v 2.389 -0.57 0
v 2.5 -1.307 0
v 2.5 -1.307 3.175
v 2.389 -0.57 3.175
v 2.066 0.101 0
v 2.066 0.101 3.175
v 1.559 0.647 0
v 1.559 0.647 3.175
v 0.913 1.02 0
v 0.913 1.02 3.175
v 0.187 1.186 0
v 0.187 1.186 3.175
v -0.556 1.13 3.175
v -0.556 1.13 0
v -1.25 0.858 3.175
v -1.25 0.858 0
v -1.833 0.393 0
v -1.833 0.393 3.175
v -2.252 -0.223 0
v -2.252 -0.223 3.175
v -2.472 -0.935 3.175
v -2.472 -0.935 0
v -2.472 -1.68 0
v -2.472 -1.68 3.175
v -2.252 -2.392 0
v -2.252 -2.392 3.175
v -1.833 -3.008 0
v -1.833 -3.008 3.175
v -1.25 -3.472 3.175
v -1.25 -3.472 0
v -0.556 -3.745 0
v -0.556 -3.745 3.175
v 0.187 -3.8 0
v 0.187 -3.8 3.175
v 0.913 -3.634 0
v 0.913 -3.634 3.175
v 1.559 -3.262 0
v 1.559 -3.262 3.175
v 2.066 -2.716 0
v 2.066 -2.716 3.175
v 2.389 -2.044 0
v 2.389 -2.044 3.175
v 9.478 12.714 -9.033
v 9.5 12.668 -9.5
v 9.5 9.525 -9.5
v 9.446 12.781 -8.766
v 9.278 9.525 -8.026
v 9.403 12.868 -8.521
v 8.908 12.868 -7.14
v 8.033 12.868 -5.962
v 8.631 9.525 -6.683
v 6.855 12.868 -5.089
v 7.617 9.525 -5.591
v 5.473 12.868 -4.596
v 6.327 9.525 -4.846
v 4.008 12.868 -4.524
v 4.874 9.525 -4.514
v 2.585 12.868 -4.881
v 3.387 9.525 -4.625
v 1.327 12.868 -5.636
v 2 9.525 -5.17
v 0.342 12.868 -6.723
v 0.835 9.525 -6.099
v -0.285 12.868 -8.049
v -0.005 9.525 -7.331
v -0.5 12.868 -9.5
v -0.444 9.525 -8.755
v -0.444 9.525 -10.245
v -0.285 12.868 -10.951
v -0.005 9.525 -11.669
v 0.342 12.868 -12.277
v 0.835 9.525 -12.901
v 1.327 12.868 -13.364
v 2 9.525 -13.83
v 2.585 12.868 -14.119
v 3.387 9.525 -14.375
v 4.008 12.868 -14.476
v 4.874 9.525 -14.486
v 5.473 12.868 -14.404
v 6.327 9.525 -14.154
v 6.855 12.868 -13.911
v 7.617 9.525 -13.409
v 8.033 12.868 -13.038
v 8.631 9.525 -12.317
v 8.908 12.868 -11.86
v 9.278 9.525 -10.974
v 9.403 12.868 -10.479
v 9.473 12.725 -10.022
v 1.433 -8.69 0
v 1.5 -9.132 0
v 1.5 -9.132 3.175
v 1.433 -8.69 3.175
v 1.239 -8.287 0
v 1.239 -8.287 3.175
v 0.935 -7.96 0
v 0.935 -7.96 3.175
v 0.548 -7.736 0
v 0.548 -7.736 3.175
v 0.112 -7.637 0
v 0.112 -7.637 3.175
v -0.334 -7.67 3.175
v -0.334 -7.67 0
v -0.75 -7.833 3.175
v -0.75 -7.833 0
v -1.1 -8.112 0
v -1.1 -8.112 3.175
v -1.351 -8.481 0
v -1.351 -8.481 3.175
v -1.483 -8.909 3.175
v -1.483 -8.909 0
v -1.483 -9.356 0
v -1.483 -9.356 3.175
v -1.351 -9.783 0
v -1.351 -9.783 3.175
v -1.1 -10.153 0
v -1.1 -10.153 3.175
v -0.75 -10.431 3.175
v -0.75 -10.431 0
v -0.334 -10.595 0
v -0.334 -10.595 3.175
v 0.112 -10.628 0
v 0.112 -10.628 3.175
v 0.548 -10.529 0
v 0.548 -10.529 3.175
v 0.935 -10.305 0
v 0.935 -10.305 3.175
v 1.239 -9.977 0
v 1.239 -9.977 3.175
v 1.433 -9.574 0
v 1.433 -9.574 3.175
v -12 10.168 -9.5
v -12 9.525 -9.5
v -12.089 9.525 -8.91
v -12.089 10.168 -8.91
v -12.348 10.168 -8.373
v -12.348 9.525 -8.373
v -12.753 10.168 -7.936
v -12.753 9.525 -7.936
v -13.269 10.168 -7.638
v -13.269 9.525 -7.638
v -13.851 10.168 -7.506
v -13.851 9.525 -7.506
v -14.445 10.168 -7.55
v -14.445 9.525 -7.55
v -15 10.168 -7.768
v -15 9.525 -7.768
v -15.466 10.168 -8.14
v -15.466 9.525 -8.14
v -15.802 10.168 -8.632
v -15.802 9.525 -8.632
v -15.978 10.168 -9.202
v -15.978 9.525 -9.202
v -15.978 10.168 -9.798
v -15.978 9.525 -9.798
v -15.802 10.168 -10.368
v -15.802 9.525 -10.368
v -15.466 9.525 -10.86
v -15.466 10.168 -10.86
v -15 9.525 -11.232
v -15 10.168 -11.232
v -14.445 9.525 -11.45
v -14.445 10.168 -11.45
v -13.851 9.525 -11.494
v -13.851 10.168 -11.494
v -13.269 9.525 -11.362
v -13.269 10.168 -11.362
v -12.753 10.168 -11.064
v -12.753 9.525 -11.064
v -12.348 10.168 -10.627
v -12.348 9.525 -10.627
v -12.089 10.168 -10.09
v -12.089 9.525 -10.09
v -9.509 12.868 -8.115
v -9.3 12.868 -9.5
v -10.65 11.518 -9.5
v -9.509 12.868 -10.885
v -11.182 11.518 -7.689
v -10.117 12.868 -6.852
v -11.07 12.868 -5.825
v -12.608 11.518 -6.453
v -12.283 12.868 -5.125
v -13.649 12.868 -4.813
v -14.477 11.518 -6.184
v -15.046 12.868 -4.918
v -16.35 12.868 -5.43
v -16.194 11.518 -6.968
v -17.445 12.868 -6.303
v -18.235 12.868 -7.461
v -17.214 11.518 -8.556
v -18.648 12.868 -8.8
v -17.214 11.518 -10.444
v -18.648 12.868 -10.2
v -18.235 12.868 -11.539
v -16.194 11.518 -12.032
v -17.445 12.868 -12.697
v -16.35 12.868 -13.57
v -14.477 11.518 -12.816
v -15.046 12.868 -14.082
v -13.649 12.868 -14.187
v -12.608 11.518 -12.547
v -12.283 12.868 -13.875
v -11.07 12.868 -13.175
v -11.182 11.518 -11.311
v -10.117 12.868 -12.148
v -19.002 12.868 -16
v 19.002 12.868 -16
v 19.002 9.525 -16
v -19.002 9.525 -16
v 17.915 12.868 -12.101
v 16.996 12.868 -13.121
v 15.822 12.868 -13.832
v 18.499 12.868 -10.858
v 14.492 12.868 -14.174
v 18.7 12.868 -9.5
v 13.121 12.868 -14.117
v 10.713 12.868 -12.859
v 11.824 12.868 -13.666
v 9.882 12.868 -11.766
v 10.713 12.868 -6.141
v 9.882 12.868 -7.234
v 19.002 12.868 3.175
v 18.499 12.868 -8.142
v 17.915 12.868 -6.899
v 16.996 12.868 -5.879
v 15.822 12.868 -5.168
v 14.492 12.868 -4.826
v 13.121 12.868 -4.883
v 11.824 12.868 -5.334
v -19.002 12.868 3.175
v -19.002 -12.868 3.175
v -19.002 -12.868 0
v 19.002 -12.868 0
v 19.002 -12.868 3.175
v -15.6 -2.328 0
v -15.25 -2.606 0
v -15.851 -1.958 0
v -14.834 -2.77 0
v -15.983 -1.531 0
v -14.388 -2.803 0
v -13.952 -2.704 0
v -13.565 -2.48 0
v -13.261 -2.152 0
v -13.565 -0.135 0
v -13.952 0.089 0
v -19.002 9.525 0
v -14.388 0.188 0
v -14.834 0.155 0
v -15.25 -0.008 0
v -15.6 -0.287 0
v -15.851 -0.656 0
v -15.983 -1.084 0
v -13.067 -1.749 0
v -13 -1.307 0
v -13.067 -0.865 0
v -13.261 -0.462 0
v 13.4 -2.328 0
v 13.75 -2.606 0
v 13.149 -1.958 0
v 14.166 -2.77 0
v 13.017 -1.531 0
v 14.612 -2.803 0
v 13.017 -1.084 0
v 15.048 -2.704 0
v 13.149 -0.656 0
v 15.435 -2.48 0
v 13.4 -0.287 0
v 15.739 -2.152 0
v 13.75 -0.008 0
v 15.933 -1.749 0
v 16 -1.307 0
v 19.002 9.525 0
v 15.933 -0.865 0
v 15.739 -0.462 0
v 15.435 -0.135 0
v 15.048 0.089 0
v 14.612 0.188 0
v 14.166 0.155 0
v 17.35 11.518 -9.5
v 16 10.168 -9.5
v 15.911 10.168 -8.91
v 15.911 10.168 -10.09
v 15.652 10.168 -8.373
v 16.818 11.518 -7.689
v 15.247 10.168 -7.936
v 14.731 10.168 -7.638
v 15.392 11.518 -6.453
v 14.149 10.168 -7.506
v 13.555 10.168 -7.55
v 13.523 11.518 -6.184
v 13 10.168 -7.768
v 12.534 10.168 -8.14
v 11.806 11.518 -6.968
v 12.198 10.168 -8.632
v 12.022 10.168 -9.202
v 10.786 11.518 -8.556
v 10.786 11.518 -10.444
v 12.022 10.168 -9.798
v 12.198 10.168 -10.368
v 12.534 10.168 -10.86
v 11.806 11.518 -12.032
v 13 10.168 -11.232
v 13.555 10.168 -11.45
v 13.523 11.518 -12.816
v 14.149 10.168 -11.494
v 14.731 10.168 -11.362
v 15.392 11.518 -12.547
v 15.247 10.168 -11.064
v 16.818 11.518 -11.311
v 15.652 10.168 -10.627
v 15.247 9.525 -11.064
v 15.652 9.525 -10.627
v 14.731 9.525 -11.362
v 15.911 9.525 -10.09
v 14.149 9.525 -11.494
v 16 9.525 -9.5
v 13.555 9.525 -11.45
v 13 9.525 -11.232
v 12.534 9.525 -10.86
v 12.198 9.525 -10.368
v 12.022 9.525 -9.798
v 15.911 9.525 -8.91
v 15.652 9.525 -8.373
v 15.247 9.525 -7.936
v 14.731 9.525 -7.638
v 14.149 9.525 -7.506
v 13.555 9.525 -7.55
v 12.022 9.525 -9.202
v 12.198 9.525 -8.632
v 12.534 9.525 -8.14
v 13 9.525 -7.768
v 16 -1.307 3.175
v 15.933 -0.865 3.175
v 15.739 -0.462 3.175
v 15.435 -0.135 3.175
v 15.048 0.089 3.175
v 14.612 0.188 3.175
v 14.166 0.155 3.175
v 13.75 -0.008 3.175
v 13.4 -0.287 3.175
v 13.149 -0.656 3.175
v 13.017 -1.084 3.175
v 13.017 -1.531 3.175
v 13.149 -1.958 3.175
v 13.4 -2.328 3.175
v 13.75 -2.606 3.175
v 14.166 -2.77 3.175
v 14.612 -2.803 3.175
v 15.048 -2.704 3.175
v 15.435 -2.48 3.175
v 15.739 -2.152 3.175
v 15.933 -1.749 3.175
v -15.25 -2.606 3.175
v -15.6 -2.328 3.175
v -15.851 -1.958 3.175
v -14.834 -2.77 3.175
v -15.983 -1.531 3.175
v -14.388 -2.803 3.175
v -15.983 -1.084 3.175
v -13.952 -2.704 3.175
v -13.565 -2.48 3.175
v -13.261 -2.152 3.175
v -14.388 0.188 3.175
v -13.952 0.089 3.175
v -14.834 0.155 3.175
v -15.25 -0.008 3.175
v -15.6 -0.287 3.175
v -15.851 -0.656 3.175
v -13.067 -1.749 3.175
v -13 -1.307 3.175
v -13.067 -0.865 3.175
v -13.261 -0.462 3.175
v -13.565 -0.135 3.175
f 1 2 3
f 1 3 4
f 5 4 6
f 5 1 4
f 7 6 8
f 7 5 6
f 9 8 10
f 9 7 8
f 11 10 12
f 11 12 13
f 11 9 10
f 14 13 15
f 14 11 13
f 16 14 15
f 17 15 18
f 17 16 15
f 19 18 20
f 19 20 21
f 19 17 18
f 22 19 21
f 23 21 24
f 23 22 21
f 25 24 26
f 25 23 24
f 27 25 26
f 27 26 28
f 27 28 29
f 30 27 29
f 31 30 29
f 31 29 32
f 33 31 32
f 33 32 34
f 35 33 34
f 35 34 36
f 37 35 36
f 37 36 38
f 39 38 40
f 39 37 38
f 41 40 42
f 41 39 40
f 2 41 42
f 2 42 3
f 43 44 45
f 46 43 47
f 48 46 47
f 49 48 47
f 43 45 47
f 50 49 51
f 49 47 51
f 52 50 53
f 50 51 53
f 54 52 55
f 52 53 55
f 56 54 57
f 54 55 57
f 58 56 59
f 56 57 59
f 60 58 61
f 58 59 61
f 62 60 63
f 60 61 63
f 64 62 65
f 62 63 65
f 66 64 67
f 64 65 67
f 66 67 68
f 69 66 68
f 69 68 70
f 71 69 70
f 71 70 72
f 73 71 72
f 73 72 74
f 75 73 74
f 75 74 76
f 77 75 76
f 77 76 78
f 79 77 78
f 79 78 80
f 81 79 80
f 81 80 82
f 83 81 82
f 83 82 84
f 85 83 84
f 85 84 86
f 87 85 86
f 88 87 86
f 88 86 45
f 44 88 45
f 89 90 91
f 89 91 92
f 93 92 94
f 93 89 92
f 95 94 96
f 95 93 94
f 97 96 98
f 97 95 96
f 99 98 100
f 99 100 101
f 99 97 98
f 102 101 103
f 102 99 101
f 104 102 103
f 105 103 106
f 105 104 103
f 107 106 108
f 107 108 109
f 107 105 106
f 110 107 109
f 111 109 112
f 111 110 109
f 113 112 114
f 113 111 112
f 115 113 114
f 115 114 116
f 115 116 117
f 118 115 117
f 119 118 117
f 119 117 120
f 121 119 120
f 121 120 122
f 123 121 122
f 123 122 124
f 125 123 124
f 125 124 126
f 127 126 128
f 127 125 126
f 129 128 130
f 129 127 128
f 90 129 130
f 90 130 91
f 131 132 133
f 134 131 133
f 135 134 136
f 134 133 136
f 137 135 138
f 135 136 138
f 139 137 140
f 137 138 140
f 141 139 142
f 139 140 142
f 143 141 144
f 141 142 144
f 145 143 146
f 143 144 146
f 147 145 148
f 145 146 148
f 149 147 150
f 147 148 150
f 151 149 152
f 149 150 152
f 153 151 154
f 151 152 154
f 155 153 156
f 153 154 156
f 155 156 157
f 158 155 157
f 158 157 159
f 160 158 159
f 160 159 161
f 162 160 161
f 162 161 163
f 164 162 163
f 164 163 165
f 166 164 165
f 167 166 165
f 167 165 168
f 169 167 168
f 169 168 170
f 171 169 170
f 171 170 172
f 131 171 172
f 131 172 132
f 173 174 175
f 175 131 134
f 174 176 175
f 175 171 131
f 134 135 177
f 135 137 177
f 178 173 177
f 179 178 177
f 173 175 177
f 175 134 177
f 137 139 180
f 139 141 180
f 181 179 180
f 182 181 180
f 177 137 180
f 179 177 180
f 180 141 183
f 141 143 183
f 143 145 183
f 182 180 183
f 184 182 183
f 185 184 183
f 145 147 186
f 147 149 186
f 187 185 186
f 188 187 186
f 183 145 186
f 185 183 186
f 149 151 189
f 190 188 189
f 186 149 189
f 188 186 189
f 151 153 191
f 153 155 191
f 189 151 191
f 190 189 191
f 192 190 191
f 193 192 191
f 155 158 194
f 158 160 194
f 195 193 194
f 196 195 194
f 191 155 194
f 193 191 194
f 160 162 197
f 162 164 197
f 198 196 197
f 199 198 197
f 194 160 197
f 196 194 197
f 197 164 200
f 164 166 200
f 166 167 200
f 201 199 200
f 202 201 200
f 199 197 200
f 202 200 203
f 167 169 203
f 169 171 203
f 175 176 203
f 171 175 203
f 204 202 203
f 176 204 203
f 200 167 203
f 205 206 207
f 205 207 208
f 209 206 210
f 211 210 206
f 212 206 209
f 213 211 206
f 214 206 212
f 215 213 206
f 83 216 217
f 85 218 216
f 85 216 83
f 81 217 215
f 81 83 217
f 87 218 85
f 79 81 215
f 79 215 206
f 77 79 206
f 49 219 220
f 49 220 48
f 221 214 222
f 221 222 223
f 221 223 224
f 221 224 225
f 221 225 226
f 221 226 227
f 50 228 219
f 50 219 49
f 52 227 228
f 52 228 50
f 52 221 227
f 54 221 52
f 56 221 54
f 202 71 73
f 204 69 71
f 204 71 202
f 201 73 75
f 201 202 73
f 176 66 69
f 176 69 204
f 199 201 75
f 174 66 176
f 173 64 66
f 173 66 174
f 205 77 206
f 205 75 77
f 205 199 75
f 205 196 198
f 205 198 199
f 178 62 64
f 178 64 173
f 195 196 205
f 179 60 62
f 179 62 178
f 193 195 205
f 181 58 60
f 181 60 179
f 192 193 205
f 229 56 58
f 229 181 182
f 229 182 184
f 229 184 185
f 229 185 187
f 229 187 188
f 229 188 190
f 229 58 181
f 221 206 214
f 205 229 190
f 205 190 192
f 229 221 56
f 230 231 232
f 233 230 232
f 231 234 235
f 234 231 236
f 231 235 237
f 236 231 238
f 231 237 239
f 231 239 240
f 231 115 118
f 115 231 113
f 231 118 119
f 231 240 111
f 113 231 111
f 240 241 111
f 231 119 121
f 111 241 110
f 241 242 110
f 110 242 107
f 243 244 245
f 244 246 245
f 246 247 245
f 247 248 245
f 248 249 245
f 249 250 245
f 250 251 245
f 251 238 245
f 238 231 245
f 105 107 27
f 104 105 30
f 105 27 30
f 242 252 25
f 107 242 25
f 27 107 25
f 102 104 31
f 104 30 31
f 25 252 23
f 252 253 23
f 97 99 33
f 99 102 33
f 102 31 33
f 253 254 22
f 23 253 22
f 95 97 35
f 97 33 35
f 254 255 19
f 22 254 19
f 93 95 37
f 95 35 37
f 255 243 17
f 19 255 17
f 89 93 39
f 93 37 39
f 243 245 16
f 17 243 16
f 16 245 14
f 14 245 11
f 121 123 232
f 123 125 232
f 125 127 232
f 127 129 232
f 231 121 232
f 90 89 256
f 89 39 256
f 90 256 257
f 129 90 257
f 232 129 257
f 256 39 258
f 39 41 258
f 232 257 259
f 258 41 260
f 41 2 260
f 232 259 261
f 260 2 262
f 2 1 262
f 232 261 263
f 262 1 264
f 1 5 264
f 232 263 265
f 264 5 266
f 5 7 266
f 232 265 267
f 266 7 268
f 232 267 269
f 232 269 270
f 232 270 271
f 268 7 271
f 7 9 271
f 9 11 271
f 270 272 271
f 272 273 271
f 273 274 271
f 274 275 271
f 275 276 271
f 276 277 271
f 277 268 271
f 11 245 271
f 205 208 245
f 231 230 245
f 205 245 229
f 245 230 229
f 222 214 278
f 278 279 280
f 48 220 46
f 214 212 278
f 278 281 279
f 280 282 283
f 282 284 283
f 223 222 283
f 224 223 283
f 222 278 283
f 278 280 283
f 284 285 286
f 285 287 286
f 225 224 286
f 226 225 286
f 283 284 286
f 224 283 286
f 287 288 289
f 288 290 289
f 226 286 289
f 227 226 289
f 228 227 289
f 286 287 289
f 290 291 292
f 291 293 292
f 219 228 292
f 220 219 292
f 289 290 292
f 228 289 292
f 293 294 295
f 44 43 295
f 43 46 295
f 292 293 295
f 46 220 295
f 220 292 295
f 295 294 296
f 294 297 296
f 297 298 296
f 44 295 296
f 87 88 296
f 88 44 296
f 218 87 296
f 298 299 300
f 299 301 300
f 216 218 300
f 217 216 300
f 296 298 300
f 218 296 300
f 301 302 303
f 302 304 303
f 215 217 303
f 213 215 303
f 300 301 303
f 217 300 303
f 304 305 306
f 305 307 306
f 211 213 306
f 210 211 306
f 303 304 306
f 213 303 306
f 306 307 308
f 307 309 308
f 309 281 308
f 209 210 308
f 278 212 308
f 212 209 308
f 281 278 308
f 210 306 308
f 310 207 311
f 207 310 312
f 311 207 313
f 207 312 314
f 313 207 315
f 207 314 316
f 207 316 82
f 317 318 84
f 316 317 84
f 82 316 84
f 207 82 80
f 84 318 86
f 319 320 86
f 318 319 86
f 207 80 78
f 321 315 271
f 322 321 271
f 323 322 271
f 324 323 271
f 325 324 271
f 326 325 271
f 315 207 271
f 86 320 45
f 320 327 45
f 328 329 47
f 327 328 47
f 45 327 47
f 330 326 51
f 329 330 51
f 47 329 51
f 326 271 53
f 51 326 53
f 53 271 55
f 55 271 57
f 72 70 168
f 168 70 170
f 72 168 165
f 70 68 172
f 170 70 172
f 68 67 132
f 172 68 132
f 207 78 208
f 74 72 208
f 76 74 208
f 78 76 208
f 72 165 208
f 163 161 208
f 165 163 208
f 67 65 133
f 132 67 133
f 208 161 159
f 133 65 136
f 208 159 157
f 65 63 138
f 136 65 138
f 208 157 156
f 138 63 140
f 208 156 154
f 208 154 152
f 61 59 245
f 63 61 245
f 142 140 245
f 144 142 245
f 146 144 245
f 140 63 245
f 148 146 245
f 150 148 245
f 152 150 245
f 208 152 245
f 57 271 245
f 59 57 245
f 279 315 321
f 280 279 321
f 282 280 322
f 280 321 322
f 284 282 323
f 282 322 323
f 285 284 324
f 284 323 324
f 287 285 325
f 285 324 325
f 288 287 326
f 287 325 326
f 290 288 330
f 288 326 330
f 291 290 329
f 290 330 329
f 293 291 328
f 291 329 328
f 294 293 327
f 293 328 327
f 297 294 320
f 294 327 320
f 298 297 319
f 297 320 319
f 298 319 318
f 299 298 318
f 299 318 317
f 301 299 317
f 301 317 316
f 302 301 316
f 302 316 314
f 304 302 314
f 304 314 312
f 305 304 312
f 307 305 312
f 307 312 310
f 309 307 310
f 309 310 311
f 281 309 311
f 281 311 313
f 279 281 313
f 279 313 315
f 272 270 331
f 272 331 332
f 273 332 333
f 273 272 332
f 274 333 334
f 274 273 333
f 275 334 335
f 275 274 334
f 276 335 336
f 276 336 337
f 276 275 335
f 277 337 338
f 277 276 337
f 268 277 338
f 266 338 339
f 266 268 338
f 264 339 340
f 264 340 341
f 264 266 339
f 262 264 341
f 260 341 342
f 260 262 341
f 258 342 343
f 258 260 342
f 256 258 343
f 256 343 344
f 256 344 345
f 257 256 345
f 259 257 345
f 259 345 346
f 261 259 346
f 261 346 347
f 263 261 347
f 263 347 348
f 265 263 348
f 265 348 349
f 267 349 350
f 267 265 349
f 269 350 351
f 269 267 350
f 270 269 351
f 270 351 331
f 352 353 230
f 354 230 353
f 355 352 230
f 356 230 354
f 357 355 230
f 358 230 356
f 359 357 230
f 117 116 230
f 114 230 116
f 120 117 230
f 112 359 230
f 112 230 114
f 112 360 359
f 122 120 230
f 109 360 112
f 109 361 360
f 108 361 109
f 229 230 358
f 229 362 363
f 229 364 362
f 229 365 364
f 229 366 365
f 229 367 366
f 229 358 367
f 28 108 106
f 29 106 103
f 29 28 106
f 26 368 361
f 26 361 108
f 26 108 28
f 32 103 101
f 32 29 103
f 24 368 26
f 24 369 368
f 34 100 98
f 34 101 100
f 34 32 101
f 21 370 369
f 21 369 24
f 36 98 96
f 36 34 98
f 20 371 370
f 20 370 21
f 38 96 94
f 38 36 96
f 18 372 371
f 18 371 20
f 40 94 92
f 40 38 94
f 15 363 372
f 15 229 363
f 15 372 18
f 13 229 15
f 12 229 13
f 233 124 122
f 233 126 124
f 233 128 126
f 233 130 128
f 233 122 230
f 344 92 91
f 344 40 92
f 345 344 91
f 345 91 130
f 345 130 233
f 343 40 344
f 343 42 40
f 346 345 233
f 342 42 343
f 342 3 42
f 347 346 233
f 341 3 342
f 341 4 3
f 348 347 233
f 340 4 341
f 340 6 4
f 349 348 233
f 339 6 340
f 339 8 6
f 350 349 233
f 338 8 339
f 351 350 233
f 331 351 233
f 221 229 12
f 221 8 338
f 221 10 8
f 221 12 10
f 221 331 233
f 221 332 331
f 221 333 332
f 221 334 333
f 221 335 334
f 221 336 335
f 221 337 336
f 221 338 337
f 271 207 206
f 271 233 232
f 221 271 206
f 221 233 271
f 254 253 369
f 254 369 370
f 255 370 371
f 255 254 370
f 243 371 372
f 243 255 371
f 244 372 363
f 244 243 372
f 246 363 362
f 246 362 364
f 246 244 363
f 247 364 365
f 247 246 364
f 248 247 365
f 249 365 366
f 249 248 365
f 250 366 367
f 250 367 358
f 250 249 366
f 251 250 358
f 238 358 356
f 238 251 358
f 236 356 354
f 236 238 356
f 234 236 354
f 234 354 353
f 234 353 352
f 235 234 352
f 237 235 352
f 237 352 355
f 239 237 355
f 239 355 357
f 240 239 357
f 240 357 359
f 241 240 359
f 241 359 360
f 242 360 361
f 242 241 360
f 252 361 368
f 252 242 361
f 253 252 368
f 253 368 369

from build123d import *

# Parameters (mm, degrees)
SKETCH1_W                                            = 38.00356671
SKETCH1_H                                            = 25.735371596
SKETCH1_R                                            = 1.5
SKETCH1_R_2                                          = 2.5
BOSS_EXTRUDE1_DEPTH                                  = 3.175
SKETCH2_W                                            = 38.00356671
SKETCH2_H                                            = 3.342685798
BOSS_EXTRUDE2_DEPTH                                  = 16
SKETCH3_R                                            = 5
SKETCH3_R_2                                          = 2
CUT_EXTRUDE1_DEPTH                                   = 10
ESCAREADO_PARA_PARAFUSO_DE_M_QUINA_COM_C_D           = 4
ESCAREADO_PARA_PARAFUSO_DE_M_QUINA_COM_C_CSINK_D     = 9.4
ESCAREADO_PARA_PARAFUSO_DE_M_QUINA_COM_C_CSINK_ANGLE = 90


with BuildPart() as part:
    # Sketch1 → Boss-Extrude1 (new body)
    with BuildSketch(Plane.XY):
        Rectangle(SKETCH1_W, SKETCH1_H)
        with Locations((-14.5, -1.307314202)):
            Circle(SKETCH1_R, mode=Mode.SUBTRACT)
        with Locations((14.5, -1.307314202)):
            Circle(SKETCH1_R, mode=Mode.SUBTRACT)
        with Locations((0, -1.307314202)):
            Circle(SKETCH1_R_2, mode=Mode.SUBTRACT)
        with Locations((0, -9.132314202)):
            Circle(SKETCH1_R, mode=Mode.SUBTRACT)
    extrude(amount=BOSS_EXTRUDE1_DEPTH)

    # Sketch2 → Boss-Extrude2 (add)
    with BuildSketch(Plane(origin=(0, 0, 0), x_dir=(-1, 0, 0), z_dir=(0, 0, -1))):
        with Locations((0, 11.196342899)):
            Rectangle(SKETCH2_W, SKETCH2_H)
    extrude(amount=BOSS_EXTRUDE2_DEPTH)

    # Sketch3 → Cut-Extrude1 (cut)
    with BuildSketch(Plane.XZ.offset(-9.525)):
        with Locations((4.5, -9.5)):
            Circle(SKETCH3_R)
        with Locations((-14, -9.5)):
            Circle(SKETCH3_R_2)
        with Locations((14, -9.5)):
            Circle(SKETCH3_R_2)
    extrude(amount=-CUT_EXTRUDE1_DEPTH, mode=Mode.SUBTRACT)

    # Escareado para parafuso de máquina com cabeça chata de M42 (through all)
    with Locations(Plane(origin=(0, 12.867685798, 0), x_dir=(-1, 0, 0), z_dir=(0, 1, 0))):
        with Locations((14, -9.5), (-14, -9.5)):
            CounterSinkHole(ESCAREADO_PARA_PARAFUSO_DE_M_QUINA_COM_C_D / 2, ESCAREADO_PARA_PARAFUSO_DE_M_QUINA_COM_C_CSINK_D / 2, counter_sink_angle=ESCAREADO_PARA_PARAFUSO_DE_M_QUINA_COM_C_CSINK_ANGLE)


solid = part.part
